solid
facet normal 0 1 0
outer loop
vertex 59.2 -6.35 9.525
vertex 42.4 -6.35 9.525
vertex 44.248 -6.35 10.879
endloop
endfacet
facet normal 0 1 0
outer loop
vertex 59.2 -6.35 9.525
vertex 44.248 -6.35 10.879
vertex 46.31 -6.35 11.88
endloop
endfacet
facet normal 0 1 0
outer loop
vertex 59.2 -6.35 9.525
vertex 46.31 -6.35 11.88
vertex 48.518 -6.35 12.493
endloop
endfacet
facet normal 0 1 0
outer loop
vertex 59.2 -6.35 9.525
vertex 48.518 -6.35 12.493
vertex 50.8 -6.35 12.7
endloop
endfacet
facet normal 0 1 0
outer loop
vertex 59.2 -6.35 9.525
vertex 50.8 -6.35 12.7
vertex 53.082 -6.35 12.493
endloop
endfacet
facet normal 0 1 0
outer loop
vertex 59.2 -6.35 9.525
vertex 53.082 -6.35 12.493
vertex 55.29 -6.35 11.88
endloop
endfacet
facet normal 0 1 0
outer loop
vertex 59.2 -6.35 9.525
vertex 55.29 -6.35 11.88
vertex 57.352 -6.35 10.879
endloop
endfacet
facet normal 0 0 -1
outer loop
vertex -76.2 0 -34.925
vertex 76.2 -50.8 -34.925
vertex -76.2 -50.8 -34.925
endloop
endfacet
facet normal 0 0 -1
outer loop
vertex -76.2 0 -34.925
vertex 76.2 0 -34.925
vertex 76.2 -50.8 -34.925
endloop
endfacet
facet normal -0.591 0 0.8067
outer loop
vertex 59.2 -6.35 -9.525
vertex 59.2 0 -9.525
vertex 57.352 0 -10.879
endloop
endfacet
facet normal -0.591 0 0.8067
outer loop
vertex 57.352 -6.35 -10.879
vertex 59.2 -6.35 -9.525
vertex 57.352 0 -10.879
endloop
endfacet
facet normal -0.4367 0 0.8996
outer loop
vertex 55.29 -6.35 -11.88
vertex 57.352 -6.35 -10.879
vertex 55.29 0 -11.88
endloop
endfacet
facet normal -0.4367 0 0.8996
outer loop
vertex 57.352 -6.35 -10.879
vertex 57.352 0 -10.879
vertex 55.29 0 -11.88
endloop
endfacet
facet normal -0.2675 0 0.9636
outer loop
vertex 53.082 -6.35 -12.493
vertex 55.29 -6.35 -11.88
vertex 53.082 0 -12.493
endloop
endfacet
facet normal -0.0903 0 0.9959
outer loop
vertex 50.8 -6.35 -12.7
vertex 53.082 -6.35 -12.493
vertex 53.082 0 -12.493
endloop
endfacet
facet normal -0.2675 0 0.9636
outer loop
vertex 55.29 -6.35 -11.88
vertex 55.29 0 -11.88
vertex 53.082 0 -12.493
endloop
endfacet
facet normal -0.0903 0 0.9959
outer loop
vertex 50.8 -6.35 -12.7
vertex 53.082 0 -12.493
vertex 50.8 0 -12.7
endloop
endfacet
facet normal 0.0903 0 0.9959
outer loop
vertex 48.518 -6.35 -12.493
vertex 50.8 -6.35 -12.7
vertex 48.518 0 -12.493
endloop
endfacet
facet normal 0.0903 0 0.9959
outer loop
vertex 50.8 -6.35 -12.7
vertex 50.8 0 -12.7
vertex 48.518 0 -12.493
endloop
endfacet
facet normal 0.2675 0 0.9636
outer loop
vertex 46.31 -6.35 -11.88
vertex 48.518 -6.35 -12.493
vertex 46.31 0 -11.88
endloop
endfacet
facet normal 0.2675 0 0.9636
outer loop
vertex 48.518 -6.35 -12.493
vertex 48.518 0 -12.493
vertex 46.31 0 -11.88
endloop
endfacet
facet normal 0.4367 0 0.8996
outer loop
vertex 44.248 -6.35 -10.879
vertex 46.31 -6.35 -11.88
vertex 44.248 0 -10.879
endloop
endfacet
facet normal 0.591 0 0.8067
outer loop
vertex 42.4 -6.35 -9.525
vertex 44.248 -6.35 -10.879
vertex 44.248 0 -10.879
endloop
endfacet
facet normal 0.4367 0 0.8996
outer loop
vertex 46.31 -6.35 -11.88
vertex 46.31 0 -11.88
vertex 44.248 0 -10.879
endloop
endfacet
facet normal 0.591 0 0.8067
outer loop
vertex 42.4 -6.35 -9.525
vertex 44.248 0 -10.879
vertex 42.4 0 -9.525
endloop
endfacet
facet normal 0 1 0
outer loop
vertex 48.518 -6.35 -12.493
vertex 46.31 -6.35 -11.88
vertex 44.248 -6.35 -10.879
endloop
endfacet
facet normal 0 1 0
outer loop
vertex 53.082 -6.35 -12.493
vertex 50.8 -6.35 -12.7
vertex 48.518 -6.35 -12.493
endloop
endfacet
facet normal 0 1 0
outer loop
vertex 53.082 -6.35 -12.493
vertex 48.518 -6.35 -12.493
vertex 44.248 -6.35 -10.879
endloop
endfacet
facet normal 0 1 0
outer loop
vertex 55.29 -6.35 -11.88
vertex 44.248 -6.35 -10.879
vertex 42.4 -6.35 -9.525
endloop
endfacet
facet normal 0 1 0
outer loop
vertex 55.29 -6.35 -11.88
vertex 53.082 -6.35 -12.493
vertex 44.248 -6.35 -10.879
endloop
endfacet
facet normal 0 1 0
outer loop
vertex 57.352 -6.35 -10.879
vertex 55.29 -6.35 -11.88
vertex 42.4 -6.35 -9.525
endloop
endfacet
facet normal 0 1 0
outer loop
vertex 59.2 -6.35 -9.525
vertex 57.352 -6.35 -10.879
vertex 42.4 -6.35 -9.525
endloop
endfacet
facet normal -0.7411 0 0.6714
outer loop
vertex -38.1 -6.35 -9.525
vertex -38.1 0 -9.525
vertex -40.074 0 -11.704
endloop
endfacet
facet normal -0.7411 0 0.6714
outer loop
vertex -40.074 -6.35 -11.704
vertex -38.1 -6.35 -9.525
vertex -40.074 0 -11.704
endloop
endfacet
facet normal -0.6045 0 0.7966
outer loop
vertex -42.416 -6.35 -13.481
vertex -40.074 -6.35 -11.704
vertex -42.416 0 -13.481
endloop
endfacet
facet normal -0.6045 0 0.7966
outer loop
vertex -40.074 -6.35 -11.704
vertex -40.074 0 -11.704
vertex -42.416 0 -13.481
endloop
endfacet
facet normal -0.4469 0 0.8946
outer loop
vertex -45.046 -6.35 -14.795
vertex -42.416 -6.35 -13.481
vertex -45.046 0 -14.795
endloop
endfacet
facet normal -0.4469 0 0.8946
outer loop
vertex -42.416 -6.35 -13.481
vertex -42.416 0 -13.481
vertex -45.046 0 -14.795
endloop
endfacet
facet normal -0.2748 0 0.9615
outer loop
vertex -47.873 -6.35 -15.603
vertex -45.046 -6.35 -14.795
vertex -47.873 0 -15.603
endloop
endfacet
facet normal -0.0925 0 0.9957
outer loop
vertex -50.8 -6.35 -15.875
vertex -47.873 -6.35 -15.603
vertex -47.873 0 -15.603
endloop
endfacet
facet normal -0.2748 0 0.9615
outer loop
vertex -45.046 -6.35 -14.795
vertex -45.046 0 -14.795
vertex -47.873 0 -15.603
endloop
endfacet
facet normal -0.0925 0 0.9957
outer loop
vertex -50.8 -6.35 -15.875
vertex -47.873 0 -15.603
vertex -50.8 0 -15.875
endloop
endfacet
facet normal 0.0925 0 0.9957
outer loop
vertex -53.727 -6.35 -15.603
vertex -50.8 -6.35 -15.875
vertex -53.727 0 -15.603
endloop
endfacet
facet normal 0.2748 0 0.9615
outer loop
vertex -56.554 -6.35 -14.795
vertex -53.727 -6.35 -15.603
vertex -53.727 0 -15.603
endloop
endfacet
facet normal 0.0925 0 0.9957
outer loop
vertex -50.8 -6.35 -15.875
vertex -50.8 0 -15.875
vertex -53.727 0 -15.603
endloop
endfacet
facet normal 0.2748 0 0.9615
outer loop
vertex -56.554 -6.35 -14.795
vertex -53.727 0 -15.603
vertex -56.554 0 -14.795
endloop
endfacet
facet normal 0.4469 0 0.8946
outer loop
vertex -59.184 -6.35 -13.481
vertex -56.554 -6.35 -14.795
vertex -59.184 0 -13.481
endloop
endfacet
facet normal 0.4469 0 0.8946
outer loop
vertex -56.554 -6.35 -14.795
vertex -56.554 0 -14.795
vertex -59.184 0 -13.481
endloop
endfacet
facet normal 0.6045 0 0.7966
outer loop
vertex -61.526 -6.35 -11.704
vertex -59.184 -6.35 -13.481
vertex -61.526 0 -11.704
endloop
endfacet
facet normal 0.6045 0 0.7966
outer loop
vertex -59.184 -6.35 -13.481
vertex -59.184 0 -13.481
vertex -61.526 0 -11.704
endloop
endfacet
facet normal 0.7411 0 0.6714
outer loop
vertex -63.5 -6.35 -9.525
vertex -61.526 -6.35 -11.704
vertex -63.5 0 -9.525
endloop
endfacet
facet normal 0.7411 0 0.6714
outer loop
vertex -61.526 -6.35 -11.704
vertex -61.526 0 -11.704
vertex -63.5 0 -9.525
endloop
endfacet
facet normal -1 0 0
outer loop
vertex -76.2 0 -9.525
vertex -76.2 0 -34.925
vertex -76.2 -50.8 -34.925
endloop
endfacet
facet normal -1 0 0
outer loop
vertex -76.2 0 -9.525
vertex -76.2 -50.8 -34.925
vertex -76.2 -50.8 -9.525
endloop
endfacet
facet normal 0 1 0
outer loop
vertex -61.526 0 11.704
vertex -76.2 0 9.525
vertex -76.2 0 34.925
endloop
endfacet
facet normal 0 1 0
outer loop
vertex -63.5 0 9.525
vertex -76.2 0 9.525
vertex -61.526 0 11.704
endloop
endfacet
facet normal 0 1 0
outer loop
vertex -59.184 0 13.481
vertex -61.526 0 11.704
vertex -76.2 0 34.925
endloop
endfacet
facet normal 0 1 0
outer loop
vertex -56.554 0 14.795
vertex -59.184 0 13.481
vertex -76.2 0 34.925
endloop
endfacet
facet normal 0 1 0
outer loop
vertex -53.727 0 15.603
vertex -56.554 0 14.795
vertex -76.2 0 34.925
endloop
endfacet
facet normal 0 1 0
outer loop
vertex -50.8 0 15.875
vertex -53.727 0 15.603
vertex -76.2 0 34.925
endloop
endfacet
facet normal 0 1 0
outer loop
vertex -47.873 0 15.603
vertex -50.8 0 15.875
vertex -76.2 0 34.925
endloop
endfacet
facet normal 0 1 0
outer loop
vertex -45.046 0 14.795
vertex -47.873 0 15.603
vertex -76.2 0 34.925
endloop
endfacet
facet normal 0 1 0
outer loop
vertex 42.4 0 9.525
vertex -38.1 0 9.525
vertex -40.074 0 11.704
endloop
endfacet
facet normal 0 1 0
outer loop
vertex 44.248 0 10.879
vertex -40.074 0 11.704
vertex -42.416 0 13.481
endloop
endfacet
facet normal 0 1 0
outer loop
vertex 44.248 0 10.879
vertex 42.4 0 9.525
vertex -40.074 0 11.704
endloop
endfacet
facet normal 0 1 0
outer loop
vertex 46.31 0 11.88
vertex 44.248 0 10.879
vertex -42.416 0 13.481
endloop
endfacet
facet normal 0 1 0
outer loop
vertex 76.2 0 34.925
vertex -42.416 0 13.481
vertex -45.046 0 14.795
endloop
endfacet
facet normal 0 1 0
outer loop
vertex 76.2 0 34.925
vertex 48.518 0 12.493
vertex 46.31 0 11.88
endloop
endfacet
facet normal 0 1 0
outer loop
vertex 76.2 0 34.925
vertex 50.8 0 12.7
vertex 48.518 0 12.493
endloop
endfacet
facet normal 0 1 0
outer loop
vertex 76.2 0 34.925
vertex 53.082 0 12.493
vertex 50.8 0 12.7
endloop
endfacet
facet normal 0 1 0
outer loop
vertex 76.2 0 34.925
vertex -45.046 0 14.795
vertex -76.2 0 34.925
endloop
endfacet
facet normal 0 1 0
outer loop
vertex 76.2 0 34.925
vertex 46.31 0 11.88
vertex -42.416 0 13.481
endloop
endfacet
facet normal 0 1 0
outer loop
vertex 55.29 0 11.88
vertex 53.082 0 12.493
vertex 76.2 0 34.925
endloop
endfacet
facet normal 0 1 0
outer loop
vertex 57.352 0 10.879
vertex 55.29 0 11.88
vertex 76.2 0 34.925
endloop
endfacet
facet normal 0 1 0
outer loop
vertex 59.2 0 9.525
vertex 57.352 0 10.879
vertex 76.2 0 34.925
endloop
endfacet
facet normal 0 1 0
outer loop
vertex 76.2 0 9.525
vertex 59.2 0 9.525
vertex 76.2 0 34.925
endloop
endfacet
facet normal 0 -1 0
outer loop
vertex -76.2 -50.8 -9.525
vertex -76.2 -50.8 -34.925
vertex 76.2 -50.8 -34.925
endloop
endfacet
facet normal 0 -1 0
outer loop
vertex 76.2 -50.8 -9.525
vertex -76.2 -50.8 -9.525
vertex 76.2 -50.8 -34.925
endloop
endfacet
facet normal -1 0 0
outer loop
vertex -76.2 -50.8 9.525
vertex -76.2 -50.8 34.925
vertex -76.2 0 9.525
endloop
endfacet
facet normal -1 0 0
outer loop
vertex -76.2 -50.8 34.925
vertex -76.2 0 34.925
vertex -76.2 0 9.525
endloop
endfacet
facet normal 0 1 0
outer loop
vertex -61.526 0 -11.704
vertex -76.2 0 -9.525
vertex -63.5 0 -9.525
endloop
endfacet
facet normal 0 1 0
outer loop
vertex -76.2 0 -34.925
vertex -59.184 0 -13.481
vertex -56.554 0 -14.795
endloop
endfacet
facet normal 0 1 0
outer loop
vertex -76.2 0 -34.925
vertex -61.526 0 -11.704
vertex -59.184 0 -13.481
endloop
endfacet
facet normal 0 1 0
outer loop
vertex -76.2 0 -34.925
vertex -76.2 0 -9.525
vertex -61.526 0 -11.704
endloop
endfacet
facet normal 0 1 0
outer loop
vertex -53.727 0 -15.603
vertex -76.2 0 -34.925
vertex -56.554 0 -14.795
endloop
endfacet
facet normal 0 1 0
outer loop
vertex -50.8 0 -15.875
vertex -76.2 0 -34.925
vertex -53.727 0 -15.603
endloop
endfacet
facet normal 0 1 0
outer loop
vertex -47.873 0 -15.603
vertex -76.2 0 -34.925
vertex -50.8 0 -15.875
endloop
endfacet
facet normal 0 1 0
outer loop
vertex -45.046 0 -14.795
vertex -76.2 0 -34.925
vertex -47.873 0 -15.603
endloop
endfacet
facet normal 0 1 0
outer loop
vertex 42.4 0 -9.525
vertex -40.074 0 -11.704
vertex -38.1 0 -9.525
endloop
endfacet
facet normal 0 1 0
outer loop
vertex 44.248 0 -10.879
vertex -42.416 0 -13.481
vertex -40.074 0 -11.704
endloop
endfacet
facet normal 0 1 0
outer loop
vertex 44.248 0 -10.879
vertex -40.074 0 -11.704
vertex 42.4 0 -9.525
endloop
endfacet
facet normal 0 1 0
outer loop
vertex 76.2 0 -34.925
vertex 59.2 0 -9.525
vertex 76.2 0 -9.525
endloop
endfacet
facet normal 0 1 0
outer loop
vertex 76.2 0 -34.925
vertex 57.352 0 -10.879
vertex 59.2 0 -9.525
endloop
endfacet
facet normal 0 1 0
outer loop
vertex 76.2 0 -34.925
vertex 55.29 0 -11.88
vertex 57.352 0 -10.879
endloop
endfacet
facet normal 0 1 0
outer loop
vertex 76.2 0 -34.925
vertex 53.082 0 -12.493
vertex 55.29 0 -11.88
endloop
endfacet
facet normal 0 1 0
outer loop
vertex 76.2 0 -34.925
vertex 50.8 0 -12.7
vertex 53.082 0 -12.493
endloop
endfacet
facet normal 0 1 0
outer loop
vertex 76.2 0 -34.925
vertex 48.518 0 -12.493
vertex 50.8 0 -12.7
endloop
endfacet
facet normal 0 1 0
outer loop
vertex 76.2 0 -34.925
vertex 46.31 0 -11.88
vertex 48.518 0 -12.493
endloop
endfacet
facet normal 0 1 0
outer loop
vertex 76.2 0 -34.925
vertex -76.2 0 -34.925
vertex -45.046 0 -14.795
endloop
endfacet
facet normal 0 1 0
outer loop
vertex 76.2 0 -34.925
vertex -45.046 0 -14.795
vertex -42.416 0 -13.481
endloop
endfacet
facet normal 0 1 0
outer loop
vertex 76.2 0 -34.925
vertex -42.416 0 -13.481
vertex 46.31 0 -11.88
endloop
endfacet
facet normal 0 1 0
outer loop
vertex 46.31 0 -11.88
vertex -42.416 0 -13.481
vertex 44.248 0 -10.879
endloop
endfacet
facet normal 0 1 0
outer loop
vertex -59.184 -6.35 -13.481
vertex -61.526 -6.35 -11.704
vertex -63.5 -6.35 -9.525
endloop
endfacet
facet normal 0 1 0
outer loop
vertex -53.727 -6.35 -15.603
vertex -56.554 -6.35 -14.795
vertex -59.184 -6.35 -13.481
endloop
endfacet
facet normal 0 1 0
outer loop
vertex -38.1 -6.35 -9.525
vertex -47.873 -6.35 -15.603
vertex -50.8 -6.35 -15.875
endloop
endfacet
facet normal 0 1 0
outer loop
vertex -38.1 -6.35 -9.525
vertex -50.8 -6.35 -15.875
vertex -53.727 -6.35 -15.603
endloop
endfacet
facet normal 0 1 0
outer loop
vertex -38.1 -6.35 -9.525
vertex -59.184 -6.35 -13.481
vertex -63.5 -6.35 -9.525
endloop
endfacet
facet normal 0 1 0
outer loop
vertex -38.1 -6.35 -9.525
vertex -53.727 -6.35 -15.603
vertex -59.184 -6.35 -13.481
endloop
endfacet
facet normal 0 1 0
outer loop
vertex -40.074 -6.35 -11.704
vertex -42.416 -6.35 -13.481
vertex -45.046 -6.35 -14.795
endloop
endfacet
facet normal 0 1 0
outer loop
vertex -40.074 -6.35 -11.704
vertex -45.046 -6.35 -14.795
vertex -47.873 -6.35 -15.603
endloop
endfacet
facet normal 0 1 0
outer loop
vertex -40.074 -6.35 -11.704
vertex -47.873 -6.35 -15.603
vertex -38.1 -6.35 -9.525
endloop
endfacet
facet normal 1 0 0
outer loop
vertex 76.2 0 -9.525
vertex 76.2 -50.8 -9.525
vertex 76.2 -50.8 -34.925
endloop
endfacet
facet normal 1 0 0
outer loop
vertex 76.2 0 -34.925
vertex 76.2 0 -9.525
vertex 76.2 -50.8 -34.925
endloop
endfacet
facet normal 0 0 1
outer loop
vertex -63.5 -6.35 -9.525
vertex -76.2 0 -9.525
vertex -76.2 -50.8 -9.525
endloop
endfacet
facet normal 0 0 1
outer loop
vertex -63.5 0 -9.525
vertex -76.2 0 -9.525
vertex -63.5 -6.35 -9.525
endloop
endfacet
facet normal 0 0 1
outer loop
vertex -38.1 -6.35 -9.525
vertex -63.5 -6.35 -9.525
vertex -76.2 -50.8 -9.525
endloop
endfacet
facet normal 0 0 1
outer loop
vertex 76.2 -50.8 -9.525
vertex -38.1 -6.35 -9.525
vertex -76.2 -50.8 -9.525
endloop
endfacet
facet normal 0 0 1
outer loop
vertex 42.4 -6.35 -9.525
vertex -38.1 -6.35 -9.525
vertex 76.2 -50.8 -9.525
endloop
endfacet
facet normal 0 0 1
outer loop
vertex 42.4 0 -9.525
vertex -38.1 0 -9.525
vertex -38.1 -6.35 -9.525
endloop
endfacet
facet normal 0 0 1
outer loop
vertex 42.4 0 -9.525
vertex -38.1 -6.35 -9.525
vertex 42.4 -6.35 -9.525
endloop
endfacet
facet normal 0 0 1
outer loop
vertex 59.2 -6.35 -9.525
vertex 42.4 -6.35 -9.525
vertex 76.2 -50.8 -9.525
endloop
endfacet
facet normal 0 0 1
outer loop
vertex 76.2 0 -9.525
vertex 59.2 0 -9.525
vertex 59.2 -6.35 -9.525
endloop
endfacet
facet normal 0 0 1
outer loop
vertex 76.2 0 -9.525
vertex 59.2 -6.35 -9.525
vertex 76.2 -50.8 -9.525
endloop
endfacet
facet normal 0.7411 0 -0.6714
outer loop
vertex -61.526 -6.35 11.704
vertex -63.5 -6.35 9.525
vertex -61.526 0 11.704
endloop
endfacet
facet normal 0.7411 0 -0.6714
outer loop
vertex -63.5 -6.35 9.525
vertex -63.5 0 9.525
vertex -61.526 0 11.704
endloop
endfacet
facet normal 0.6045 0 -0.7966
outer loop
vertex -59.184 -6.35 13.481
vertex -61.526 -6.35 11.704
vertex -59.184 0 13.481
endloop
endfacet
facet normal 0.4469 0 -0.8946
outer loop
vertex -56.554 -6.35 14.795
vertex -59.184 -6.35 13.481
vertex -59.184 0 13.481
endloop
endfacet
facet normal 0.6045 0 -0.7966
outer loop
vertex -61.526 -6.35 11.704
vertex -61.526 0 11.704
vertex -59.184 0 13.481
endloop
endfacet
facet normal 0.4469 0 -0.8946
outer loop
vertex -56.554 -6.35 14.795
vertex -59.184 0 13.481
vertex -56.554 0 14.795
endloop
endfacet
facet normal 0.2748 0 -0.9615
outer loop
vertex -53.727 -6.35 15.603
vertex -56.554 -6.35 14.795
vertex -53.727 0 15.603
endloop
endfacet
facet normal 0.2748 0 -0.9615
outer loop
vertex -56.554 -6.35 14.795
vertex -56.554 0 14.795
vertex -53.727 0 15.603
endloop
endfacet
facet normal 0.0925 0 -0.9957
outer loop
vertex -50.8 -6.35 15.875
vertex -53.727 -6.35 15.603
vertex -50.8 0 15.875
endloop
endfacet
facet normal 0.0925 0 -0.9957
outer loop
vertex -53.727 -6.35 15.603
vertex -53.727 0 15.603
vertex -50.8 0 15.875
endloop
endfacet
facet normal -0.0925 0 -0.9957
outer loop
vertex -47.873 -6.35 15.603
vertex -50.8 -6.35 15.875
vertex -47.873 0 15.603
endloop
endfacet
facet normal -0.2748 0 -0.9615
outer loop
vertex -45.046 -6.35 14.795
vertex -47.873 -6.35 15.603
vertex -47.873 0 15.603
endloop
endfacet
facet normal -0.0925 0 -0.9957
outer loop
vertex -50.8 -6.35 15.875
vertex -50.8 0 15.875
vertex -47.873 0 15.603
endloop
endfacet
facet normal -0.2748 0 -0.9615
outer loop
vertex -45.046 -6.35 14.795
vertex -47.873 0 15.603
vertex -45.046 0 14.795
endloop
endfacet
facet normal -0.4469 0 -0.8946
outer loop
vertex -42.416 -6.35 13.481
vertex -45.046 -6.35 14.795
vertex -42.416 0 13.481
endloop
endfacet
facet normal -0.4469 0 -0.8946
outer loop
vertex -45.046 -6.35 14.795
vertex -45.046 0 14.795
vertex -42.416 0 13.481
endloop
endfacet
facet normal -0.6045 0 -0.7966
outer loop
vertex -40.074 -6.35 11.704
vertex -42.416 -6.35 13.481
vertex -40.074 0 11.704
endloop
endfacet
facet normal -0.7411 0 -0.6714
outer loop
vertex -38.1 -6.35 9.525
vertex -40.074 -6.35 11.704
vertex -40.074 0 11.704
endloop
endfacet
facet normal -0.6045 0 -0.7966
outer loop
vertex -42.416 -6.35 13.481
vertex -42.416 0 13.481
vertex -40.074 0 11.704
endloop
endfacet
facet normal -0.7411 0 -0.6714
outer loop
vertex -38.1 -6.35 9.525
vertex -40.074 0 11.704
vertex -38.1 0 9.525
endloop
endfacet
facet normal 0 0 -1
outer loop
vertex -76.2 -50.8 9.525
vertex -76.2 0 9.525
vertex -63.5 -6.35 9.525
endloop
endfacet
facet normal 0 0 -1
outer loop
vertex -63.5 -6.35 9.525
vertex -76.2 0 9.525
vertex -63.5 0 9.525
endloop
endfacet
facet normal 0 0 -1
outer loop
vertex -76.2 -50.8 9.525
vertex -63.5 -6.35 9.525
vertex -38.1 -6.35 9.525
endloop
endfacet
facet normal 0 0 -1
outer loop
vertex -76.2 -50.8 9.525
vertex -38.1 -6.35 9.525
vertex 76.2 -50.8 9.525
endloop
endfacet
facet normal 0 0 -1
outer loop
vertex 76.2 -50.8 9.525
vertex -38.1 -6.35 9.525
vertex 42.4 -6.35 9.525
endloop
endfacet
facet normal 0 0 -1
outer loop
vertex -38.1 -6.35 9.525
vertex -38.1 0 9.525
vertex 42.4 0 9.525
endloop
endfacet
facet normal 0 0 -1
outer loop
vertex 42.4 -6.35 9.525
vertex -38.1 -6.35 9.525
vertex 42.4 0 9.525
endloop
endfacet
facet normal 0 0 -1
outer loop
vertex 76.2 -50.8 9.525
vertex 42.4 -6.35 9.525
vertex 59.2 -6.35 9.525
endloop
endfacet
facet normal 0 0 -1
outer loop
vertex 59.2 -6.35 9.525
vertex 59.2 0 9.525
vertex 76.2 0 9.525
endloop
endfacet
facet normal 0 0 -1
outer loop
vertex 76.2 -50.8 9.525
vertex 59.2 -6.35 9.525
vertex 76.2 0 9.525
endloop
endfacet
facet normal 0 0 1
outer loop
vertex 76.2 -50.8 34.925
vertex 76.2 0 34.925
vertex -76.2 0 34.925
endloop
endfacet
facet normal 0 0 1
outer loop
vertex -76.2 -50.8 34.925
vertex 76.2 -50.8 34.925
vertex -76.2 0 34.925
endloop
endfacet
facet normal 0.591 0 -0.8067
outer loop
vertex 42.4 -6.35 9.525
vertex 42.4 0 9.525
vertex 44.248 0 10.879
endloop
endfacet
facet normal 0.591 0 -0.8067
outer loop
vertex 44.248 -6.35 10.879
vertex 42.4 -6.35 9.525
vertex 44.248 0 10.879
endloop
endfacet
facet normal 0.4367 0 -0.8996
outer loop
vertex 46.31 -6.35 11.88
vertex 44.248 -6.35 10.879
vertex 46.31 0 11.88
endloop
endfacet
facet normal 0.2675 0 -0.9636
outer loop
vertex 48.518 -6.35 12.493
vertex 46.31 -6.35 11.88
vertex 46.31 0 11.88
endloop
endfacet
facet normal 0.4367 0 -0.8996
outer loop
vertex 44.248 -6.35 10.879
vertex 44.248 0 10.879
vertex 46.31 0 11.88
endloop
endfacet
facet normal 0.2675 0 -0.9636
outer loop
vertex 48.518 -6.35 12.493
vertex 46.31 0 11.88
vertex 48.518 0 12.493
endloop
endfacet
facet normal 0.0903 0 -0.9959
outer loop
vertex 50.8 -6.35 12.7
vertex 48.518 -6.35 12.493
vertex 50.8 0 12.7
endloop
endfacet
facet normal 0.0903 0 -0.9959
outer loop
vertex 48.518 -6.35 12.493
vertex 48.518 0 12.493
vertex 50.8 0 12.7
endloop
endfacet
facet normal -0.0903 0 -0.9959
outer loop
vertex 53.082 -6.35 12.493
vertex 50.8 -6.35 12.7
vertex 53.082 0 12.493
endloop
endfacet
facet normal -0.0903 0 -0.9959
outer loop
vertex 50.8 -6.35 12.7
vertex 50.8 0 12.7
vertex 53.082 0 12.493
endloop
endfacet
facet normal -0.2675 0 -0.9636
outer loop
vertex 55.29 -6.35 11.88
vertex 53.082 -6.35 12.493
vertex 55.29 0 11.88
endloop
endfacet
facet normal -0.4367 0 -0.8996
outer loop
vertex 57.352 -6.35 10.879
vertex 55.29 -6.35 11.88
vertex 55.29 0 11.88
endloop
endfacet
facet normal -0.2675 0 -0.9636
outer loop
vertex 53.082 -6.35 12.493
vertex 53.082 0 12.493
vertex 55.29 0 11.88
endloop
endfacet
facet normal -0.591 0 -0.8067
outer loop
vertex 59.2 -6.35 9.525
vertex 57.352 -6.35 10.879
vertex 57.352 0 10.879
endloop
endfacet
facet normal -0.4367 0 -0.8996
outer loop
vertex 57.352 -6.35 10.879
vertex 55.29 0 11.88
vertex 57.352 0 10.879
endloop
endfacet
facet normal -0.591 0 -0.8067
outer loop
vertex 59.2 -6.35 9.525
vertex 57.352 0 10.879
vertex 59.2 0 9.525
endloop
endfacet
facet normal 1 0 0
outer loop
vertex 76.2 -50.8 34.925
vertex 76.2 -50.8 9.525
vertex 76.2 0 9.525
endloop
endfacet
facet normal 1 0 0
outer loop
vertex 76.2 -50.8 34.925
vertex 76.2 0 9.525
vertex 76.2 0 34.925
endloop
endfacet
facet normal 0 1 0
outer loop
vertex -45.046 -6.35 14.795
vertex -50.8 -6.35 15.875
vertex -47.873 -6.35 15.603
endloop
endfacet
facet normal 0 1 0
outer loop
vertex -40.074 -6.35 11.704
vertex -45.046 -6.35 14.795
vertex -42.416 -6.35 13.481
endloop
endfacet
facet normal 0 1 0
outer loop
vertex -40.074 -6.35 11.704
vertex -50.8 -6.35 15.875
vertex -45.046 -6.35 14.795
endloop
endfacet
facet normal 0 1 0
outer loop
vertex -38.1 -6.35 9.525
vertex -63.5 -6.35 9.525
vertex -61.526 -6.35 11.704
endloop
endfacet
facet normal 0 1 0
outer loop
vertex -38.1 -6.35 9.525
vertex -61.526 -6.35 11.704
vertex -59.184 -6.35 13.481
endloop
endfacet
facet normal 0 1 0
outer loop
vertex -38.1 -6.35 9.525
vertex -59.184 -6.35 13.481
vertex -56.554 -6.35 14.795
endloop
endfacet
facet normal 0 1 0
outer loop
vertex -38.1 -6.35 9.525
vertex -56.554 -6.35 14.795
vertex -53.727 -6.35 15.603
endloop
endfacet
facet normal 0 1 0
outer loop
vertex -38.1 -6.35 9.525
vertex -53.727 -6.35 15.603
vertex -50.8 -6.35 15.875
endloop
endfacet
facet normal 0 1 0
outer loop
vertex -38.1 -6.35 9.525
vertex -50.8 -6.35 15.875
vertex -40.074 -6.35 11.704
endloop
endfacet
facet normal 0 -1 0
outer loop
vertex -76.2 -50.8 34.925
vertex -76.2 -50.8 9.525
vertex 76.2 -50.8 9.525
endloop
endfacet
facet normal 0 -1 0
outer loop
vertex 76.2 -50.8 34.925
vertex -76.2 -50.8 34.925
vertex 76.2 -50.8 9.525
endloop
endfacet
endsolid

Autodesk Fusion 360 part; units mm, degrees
sketch "Sketch1" plane through (0, 0, 0) normal (0, 1, 0) x (1, 0, 0) in component "Component"
  line L0 (76.2, -9.525) -> (-76.2, -9.525) construction
  line L1 (-76.2, -9.525) -> (-76.2, 9.525) construction
  line L2 (-76.2, 9.525) -> (76.2, 9.525) construction
  line L3 (76.2, 9.525) -> (76.2, -9.525) construction
  line L4 (76.2, -9.525) -> (-76.2, 9.525) construction
  line L5 (-76.2, -9.525) -> (76.2, 9.525) construction
  line L6 (-76.2, 9.525) -> (76.2, 9.525)
  line L7 (76.2, 9.525) -> (76.2, 34.925)
  line L8 (76.2, 34.925) -> (-76.2, 34.925)
  line L9 (-76.2, 34.925) -> (-76.2, 9.525)
  line L10 (-76.2, -9.525) -> (76.2, -9.525)
  line L11 (76.2, -9.525) -> (76.2, -34.925)
  line L12 (76.2, -34.925) -> (-76.2, -34.925)
  line L13 (-76.2, -34.925) -> (-76.2, -9.525)
  circle A0 centre (-50.8, 0) radius 15.875
  line L14 (0, 0) -> (-50.8, 0) construction
  line L15 (0, 0) -> (50.8, 0) construction
  circle A1 centre (50.8, 0) radius 12.7
  circle A2 centre (0, 3.175) radius 9.9187
  dimension "d1" = 152.4
  dimension "d2" = 19.05
  dimension "d3" = 152.4
  dimension "d4" = 25.4
  dimension "d5" = 152.4
  dimension "d6" = 25.4
  dimension "d7" = 31.75
  dimension "d8" = 50.8
  dimension "d9" = 50.8
  dimension "d10" = 25.4
  dimension "d15" = 19.8374
  dimension "d16" = 3.175
  dimension "d17" = 76.2
extrude "Extrude1" add sketch "Sketch1" against normal blind 50.8 contours L6 L7 L8 L9 A0 A1 A2 | L6 A0 | L10 L11 L12 L13 A0 A1 | L10 A0 | L6 A2 | L10 A1 | L6 A1 picked at (0.481, 11.3734) makes body 1 at (-25.4, -16.9333, 9.525) makes body 2 at (-25.4, -16.9333, -9.525) in component "Component"
extrude "Extrude2" cut sketch "Sketch1" against normal blind 6.35 contours L6 A0 | L10 A0 | L6 A2 | L10 A1 | L6 A1 picked at (0.481, 11.3734) bodies 1 2 in component "Component"
component "Component" placed x (1, 0, 0) y (0, 1, 0) z (0, 0, 1) at (0, 0, 0)
